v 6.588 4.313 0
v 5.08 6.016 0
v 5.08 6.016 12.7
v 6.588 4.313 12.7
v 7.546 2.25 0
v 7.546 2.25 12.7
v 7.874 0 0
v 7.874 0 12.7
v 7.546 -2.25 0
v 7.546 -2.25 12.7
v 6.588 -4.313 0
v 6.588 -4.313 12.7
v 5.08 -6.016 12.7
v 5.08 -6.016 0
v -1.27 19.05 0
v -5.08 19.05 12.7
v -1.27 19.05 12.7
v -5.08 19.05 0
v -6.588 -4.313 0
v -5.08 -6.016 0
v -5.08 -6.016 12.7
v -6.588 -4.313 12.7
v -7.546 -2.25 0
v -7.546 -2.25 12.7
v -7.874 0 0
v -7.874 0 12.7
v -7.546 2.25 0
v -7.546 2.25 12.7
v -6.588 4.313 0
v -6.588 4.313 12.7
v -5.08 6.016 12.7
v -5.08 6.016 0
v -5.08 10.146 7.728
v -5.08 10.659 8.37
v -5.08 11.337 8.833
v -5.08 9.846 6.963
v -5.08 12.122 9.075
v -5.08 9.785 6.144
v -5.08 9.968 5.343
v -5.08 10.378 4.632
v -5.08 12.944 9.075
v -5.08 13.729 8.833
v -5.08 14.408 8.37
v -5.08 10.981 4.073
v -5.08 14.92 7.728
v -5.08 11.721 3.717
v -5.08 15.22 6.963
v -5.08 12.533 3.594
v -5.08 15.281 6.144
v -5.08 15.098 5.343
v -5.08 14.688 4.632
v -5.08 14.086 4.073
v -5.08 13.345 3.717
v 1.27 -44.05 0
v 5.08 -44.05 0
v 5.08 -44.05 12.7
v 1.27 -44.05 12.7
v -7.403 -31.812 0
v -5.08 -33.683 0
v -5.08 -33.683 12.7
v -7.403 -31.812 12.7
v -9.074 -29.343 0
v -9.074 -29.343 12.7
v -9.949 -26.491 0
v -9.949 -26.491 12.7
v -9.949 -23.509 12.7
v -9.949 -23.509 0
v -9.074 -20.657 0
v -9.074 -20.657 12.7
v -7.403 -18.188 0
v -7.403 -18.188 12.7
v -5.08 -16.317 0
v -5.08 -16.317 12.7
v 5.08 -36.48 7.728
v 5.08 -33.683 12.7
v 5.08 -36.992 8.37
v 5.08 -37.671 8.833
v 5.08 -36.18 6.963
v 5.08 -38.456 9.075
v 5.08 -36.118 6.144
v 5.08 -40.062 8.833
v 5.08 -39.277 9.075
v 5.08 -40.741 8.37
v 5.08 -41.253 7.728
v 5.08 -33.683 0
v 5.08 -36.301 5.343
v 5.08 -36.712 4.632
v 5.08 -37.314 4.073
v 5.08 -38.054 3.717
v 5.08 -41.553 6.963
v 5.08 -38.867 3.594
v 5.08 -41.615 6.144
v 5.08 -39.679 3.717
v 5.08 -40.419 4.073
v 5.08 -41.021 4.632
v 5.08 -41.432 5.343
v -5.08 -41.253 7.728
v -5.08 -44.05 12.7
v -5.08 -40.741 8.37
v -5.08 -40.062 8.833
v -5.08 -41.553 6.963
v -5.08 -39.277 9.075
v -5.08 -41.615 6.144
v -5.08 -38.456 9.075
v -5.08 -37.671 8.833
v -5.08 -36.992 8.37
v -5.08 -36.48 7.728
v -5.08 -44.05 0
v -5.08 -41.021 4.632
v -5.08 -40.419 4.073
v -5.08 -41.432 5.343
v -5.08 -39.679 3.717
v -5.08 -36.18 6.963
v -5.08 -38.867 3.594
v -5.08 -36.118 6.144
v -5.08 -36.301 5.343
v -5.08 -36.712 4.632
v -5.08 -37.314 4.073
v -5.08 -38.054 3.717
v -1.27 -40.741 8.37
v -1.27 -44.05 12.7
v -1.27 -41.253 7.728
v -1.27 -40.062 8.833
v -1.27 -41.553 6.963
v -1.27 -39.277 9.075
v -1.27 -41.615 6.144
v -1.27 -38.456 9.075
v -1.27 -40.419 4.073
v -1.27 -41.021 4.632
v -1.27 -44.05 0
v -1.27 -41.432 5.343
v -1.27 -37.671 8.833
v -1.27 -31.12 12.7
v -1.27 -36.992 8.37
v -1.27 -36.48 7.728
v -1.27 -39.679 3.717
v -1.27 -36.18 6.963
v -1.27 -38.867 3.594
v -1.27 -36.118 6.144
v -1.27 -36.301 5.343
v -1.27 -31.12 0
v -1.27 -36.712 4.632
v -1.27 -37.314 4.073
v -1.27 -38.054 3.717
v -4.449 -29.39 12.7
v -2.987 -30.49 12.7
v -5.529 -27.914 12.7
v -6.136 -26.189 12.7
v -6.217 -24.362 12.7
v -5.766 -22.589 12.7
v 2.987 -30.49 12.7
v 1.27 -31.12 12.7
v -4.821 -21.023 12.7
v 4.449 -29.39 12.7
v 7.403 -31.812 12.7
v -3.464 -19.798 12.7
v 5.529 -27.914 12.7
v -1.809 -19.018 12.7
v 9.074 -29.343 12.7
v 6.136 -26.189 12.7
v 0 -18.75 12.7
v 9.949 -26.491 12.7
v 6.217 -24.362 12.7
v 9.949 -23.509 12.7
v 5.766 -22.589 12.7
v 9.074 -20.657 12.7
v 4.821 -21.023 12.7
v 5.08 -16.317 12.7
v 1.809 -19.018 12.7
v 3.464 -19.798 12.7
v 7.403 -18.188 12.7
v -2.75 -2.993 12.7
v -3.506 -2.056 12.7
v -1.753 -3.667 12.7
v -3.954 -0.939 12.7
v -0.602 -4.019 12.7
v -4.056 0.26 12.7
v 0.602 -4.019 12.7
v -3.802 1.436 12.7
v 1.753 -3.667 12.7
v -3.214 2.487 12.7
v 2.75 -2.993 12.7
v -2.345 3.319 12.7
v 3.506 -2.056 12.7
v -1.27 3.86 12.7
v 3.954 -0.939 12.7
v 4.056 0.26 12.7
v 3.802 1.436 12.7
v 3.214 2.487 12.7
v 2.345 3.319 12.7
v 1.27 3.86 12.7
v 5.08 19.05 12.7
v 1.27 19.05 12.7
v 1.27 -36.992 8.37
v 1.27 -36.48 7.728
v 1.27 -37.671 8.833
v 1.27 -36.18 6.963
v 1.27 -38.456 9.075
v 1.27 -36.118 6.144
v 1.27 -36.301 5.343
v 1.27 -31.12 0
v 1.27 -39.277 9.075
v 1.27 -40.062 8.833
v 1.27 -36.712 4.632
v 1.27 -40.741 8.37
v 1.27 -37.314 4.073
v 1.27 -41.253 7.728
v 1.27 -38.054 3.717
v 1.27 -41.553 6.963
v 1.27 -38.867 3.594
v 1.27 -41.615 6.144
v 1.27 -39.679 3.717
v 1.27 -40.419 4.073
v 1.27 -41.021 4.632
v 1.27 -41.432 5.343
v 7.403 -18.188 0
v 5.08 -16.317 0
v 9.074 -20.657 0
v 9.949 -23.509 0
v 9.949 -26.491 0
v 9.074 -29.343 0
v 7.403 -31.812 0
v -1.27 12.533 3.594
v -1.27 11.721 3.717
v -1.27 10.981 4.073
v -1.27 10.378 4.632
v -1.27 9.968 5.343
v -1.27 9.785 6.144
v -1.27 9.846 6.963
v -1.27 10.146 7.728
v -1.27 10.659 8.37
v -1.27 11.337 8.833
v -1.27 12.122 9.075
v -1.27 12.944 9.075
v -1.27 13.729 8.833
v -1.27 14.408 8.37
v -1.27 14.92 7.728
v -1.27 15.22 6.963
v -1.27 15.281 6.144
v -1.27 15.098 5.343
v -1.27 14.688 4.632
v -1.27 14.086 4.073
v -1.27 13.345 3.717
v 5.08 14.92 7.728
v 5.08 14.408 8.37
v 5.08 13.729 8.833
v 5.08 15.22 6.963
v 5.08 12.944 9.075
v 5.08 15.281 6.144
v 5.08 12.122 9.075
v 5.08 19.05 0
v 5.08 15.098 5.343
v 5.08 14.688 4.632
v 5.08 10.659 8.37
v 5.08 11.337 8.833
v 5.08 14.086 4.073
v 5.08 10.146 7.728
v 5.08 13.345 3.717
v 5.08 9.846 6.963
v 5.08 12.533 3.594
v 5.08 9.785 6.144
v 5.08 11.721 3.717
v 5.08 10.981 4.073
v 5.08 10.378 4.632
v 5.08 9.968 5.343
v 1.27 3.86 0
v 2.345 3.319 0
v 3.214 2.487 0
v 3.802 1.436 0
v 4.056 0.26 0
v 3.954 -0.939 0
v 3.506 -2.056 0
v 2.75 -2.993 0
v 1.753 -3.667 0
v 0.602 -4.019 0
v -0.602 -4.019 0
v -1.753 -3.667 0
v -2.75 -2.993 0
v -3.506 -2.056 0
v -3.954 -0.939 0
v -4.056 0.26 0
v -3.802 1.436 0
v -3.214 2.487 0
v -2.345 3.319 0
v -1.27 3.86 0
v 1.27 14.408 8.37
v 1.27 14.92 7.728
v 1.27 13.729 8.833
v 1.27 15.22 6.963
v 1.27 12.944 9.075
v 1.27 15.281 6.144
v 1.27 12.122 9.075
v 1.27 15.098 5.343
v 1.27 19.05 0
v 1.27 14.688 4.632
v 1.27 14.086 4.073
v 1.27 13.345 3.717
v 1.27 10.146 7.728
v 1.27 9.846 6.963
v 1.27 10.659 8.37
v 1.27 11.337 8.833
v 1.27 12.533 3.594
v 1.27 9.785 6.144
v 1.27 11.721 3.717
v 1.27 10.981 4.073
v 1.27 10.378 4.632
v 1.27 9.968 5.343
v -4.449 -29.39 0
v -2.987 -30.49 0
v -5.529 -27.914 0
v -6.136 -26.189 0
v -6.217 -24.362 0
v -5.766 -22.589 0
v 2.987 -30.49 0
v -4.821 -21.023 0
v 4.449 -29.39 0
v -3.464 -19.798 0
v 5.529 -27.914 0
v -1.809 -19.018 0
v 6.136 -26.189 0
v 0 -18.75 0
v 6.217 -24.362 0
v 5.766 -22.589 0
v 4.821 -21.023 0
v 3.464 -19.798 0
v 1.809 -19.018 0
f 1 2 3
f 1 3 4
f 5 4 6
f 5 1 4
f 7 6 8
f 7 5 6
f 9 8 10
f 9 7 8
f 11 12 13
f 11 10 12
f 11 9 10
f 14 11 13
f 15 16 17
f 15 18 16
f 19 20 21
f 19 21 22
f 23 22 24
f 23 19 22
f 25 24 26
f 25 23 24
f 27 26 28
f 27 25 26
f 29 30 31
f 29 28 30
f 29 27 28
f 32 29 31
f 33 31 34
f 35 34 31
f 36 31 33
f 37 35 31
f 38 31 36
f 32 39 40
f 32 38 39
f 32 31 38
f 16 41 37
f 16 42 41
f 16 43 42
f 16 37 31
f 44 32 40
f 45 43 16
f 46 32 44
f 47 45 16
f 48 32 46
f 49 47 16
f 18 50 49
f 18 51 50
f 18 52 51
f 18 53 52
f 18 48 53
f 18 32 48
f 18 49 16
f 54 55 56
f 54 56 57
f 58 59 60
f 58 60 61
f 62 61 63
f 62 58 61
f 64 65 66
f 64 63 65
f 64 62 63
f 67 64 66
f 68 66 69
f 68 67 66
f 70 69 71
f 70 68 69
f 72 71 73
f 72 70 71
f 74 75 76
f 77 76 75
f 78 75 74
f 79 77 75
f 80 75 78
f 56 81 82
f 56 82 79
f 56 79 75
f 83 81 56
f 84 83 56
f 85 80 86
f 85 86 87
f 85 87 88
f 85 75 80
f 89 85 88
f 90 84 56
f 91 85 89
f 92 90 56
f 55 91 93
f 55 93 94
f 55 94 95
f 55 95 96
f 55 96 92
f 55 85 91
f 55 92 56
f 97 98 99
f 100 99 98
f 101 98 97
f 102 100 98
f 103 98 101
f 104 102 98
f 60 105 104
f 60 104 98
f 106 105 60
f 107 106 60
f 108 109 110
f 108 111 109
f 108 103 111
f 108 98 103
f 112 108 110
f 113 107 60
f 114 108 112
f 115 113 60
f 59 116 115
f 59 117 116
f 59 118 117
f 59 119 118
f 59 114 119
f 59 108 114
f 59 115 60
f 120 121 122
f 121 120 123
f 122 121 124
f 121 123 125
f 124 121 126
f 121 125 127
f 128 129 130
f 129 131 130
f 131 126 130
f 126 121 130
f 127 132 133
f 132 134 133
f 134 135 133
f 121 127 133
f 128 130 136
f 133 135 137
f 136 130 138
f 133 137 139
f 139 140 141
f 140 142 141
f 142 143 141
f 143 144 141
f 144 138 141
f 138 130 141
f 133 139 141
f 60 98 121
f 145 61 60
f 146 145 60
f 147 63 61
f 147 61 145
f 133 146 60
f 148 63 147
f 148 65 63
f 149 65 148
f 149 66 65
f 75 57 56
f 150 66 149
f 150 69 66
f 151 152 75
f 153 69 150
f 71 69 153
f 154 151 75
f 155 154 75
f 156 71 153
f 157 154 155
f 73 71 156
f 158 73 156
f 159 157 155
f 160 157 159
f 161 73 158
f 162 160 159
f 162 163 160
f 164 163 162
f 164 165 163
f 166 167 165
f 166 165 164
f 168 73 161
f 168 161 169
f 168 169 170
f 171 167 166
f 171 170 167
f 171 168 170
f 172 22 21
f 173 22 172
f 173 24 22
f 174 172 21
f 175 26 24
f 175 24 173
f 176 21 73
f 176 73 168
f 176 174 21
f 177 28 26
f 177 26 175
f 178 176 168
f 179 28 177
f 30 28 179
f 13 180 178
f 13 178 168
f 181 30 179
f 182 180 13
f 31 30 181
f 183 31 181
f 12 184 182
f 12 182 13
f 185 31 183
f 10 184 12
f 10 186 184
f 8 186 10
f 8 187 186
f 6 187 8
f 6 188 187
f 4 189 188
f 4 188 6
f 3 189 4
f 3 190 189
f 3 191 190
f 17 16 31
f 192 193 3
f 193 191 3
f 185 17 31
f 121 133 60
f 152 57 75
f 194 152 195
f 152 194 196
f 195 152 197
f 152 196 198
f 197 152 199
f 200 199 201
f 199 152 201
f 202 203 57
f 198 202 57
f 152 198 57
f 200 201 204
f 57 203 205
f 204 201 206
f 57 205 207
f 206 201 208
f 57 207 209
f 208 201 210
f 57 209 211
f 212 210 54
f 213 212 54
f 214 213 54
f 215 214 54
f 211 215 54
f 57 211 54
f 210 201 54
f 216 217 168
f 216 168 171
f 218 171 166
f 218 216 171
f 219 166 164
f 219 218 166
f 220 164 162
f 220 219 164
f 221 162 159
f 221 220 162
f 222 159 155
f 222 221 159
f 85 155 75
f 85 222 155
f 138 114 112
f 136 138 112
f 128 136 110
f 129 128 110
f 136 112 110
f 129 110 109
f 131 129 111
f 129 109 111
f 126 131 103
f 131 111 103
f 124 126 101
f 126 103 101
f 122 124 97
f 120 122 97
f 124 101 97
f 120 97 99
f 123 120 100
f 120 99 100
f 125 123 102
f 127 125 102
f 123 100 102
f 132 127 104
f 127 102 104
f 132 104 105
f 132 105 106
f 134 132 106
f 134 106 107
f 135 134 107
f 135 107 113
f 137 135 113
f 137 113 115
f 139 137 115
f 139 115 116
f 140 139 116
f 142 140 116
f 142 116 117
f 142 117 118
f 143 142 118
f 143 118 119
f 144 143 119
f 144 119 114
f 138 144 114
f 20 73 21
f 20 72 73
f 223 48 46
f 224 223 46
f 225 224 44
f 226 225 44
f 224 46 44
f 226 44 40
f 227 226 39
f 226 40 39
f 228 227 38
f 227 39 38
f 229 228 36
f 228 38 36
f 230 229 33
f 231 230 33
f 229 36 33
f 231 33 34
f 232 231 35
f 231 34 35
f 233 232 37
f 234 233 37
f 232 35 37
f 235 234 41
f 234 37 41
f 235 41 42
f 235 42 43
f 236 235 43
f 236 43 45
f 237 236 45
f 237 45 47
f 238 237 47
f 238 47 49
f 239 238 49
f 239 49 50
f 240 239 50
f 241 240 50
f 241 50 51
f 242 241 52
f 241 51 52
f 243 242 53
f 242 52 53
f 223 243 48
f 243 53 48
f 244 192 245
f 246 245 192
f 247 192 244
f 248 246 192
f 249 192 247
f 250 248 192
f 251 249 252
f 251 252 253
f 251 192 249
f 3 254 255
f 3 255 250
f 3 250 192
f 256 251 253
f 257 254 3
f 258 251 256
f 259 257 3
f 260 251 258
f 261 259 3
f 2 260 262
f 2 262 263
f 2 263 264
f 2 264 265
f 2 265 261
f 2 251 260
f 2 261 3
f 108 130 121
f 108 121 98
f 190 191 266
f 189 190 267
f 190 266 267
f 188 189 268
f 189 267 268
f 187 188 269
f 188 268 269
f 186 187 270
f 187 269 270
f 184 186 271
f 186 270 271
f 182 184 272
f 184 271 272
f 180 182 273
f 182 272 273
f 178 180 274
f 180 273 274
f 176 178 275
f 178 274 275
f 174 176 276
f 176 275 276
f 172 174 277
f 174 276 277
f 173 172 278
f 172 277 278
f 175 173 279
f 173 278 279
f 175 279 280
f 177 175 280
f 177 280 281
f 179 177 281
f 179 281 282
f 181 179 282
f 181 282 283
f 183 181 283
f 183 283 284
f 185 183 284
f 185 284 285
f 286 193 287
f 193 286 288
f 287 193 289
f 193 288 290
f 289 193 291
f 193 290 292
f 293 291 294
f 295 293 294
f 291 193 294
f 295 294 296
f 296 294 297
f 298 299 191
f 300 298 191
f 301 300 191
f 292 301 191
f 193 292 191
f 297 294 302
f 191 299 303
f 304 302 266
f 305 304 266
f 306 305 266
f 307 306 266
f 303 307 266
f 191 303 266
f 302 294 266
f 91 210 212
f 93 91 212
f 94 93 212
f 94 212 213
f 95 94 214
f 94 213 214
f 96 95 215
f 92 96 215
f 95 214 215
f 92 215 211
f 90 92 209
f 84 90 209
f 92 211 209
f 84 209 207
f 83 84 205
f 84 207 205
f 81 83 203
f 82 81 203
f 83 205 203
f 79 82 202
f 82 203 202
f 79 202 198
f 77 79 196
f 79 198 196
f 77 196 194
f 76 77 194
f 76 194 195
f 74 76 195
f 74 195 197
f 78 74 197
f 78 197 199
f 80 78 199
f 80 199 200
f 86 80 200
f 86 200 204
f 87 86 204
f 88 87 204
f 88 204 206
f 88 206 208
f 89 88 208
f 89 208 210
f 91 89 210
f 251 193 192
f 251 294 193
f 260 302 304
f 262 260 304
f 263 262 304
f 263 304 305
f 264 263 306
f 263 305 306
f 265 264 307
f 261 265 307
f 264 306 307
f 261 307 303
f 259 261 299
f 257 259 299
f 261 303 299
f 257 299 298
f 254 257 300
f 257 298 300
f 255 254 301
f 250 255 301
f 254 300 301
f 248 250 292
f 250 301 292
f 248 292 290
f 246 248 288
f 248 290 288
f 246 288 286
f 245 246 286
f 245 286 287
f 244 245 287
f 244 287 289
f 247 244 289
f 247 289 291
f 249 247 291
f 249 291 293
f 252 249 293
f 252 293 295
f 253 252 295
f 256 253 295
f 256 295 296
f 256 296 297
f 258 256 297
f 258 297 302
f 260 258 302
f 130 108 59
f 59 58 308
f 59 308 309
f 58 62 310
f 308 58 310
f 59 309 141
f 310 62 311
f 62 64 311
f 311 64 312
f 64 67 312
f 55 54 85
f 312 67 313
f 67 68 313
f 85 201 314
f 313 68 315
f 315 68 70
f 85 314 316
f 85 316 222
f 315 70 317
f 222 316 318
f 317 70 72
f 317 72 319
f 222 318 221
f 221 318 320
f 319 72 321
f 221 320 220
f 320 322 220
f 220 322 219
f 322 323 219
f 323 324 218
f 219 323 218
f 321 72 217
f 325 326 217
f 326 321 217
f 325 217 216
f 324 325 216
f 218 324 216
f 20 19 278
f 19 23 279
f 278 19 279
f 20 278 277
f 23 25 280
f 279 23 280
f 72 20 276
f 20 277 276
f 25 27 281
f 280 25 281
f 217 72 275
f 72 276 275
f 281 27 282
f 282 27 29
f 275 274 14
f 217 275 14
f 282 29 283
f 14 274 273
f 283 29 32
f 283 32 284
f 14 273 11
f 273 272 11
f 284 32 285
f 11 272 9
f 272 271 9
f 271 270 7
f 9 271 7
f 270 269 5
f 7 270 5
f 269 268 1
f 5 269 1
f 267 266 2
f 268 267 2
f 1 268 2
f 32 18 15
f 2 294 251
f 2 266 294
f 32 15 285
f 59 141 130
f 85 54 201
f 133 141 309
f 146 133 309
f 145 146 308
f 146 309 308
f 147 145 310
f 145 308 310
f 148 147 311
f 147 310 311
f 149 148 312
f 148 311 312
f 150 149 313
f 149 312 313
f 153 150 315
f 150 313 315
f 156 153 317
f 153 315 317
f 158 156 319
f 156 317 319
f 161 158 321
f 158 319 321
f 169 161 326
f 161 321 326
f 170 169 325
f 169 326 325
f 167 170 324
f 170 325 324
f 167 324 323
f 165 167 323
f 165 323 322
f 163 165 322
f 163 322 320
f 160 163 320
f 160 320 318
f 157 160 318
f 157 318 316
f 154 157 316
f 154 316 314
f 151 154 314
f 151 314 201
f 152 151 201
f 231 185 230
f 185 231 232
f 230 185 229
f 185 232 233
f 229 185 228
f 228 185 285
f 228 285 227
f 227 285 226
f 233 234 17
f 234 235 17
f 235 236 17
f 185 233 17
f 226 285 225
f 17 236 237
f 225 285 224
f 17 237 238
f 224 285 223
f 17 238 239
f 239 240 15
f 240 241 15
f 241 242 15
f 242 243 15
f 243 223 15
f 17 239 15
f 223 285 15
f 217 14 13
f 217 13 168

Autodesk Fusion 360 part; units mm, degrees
sketch "Sketch1" plane through (0, 0, 0) normal (0, 0, 1) x (1, 0, 0)
  circle A0 centre (0, 0) radius 4.064
  circle A1 centre (0, 0) radius 7.874
  circle A2 centre (0, -25) radius 10.06
  circle A3 centre (0, -25) radius 6.25
  line L0 (0, 0) -> (0, -25) construction
  line L1 (4.064, 0) -> (-4.064, 0)
  line L2 (-4.064, 0) -> (-4.064, -25)
  line L3 (-4.064, -25) -> (4.064, -25)
  line L4 (4.064, -25) -> (4.064, 0)
  line L5 (4.064, 0) -> (-4.064, -25) construction
  line L6 (-4.064, 0) -> (4.064, -25) construction
  line L7 (-1.27, 19.05) -> (1.27, 19.05)
  line L8 (1.27, 19.05) -> (1.27, -44.05)
  line L9 (1.27, -44.05) -> (-1.27, -44.05)
  line L10 (-1.27, -44.05) -> (-1.27, 19.05)
  line L11 (-1.27, 19.05) -> (1.27, -44.05) construction
  line L12 (1.27, 19.05) -> (-1.27, -44.05) construction
  line L13 (-5.08, 19.05) -> (5.08, 19.05)
  line L14 (5.08, 19.05) -> (5.08, -44.05)
  line L15 (5.08, -44.05) -> (-5.08, -44.05)
  line L16 (-5.08, -44.05) -> (-5.08, 19.05)
  line L17 (-5.08, 19.05) -> (5.08, -44.05) construction
  line L18 (5.08, 19.05) -> (-5.08, -44.05) construction
  point P0 (0, -12.5)
  point P1 (0, -12.5)
  point P2 (0, -12.5)
  dimension "d2" = 3.81
  dimension "d3" = 8.128
  dimension "d4" = 12.5
  dimension "d5" = 3.81
  dimension "d10" = 25
  dimension "d11" = 3.81
  dimension "d13" = 2.54
  dimension "d15" = 19.05
extrude "Extrude1" add sketch "Sketch1" along normal blind 12.7 contours A0 A1 L4 L8 | A0 A1 L4 L8 L14 | A0 A1 L8 L10 | A1 A2 L4 L8 | A1 A2 L4 L14 | A0 A1 L2 L10 L16 | A1 L8 L13 L14 | A0 A1 L2 L10 | A1 A2 L8 L10 | A1 L14 | A2 A3 L4 L8 | A2 A3 L4 L14 | A1 L10 L13 L16 | A1 A2 L2 L10 | A2 A3 L8 L10 | A2 A3 L14 | A1 A2 L2 L16 | A1 L16 | A2 A3 L2 L10 | A2 A3 L2 L16 | A2 L8 L14 L15 | A2 A3 L8 L14 | A2 A3 L16 | A2 A3 L10 L16 | A2 L10 L15 L16 picked at (-0.651, -6.5631) picked at (0.9887, -17.5551)
sketch "Sketch2" plane through (5.08, 0, 0) normal (1, 0, 0) x (0, 1, 0)
  line L0 (-44.05, 0) -> (-33.6832, 0)
  line L1 (-33.6832, 0) -> (-33.6832, 12.7)
  line L2 (-33.6832, 12.7) -> (-44.05, 12.7)
  line L3 (-44.05, 12.7) -> (-44.05, 0)
  line L4 (-38.8666, 12.7) -> (-38.8666, 0)
  point P0 (-38.8666, 6.35)
hole "Hole1" at (5.08, -38.8666, 6.35) direction (-1, 0, 0) diameter 5.5118 depth 40.64 tip angle 180
sketch "Sketch3" plane through (5.08, 0, 0) normal (1, 0, 0) x (0, 1, 0)
  line L0 (6.0161, 0) -> (19.05, 0)
  line L1 (19.05, 0) -> (19.05, 12.7)
  line L2 (19.05, 12.7) -> (6.0161, 12.7)
  line L3 (6.0161, 12.7) -> (6.0161, 0)
  line L4 (12.5331, 12.7) -> (12.5331, 0)
  point P0 (12.5331, 6.35)
hole "Hole2" at (5.08, 12.5331, 6.35) direction (-1, 0, 0) diameter 5.5118 depth 40.64 tip angle 180
